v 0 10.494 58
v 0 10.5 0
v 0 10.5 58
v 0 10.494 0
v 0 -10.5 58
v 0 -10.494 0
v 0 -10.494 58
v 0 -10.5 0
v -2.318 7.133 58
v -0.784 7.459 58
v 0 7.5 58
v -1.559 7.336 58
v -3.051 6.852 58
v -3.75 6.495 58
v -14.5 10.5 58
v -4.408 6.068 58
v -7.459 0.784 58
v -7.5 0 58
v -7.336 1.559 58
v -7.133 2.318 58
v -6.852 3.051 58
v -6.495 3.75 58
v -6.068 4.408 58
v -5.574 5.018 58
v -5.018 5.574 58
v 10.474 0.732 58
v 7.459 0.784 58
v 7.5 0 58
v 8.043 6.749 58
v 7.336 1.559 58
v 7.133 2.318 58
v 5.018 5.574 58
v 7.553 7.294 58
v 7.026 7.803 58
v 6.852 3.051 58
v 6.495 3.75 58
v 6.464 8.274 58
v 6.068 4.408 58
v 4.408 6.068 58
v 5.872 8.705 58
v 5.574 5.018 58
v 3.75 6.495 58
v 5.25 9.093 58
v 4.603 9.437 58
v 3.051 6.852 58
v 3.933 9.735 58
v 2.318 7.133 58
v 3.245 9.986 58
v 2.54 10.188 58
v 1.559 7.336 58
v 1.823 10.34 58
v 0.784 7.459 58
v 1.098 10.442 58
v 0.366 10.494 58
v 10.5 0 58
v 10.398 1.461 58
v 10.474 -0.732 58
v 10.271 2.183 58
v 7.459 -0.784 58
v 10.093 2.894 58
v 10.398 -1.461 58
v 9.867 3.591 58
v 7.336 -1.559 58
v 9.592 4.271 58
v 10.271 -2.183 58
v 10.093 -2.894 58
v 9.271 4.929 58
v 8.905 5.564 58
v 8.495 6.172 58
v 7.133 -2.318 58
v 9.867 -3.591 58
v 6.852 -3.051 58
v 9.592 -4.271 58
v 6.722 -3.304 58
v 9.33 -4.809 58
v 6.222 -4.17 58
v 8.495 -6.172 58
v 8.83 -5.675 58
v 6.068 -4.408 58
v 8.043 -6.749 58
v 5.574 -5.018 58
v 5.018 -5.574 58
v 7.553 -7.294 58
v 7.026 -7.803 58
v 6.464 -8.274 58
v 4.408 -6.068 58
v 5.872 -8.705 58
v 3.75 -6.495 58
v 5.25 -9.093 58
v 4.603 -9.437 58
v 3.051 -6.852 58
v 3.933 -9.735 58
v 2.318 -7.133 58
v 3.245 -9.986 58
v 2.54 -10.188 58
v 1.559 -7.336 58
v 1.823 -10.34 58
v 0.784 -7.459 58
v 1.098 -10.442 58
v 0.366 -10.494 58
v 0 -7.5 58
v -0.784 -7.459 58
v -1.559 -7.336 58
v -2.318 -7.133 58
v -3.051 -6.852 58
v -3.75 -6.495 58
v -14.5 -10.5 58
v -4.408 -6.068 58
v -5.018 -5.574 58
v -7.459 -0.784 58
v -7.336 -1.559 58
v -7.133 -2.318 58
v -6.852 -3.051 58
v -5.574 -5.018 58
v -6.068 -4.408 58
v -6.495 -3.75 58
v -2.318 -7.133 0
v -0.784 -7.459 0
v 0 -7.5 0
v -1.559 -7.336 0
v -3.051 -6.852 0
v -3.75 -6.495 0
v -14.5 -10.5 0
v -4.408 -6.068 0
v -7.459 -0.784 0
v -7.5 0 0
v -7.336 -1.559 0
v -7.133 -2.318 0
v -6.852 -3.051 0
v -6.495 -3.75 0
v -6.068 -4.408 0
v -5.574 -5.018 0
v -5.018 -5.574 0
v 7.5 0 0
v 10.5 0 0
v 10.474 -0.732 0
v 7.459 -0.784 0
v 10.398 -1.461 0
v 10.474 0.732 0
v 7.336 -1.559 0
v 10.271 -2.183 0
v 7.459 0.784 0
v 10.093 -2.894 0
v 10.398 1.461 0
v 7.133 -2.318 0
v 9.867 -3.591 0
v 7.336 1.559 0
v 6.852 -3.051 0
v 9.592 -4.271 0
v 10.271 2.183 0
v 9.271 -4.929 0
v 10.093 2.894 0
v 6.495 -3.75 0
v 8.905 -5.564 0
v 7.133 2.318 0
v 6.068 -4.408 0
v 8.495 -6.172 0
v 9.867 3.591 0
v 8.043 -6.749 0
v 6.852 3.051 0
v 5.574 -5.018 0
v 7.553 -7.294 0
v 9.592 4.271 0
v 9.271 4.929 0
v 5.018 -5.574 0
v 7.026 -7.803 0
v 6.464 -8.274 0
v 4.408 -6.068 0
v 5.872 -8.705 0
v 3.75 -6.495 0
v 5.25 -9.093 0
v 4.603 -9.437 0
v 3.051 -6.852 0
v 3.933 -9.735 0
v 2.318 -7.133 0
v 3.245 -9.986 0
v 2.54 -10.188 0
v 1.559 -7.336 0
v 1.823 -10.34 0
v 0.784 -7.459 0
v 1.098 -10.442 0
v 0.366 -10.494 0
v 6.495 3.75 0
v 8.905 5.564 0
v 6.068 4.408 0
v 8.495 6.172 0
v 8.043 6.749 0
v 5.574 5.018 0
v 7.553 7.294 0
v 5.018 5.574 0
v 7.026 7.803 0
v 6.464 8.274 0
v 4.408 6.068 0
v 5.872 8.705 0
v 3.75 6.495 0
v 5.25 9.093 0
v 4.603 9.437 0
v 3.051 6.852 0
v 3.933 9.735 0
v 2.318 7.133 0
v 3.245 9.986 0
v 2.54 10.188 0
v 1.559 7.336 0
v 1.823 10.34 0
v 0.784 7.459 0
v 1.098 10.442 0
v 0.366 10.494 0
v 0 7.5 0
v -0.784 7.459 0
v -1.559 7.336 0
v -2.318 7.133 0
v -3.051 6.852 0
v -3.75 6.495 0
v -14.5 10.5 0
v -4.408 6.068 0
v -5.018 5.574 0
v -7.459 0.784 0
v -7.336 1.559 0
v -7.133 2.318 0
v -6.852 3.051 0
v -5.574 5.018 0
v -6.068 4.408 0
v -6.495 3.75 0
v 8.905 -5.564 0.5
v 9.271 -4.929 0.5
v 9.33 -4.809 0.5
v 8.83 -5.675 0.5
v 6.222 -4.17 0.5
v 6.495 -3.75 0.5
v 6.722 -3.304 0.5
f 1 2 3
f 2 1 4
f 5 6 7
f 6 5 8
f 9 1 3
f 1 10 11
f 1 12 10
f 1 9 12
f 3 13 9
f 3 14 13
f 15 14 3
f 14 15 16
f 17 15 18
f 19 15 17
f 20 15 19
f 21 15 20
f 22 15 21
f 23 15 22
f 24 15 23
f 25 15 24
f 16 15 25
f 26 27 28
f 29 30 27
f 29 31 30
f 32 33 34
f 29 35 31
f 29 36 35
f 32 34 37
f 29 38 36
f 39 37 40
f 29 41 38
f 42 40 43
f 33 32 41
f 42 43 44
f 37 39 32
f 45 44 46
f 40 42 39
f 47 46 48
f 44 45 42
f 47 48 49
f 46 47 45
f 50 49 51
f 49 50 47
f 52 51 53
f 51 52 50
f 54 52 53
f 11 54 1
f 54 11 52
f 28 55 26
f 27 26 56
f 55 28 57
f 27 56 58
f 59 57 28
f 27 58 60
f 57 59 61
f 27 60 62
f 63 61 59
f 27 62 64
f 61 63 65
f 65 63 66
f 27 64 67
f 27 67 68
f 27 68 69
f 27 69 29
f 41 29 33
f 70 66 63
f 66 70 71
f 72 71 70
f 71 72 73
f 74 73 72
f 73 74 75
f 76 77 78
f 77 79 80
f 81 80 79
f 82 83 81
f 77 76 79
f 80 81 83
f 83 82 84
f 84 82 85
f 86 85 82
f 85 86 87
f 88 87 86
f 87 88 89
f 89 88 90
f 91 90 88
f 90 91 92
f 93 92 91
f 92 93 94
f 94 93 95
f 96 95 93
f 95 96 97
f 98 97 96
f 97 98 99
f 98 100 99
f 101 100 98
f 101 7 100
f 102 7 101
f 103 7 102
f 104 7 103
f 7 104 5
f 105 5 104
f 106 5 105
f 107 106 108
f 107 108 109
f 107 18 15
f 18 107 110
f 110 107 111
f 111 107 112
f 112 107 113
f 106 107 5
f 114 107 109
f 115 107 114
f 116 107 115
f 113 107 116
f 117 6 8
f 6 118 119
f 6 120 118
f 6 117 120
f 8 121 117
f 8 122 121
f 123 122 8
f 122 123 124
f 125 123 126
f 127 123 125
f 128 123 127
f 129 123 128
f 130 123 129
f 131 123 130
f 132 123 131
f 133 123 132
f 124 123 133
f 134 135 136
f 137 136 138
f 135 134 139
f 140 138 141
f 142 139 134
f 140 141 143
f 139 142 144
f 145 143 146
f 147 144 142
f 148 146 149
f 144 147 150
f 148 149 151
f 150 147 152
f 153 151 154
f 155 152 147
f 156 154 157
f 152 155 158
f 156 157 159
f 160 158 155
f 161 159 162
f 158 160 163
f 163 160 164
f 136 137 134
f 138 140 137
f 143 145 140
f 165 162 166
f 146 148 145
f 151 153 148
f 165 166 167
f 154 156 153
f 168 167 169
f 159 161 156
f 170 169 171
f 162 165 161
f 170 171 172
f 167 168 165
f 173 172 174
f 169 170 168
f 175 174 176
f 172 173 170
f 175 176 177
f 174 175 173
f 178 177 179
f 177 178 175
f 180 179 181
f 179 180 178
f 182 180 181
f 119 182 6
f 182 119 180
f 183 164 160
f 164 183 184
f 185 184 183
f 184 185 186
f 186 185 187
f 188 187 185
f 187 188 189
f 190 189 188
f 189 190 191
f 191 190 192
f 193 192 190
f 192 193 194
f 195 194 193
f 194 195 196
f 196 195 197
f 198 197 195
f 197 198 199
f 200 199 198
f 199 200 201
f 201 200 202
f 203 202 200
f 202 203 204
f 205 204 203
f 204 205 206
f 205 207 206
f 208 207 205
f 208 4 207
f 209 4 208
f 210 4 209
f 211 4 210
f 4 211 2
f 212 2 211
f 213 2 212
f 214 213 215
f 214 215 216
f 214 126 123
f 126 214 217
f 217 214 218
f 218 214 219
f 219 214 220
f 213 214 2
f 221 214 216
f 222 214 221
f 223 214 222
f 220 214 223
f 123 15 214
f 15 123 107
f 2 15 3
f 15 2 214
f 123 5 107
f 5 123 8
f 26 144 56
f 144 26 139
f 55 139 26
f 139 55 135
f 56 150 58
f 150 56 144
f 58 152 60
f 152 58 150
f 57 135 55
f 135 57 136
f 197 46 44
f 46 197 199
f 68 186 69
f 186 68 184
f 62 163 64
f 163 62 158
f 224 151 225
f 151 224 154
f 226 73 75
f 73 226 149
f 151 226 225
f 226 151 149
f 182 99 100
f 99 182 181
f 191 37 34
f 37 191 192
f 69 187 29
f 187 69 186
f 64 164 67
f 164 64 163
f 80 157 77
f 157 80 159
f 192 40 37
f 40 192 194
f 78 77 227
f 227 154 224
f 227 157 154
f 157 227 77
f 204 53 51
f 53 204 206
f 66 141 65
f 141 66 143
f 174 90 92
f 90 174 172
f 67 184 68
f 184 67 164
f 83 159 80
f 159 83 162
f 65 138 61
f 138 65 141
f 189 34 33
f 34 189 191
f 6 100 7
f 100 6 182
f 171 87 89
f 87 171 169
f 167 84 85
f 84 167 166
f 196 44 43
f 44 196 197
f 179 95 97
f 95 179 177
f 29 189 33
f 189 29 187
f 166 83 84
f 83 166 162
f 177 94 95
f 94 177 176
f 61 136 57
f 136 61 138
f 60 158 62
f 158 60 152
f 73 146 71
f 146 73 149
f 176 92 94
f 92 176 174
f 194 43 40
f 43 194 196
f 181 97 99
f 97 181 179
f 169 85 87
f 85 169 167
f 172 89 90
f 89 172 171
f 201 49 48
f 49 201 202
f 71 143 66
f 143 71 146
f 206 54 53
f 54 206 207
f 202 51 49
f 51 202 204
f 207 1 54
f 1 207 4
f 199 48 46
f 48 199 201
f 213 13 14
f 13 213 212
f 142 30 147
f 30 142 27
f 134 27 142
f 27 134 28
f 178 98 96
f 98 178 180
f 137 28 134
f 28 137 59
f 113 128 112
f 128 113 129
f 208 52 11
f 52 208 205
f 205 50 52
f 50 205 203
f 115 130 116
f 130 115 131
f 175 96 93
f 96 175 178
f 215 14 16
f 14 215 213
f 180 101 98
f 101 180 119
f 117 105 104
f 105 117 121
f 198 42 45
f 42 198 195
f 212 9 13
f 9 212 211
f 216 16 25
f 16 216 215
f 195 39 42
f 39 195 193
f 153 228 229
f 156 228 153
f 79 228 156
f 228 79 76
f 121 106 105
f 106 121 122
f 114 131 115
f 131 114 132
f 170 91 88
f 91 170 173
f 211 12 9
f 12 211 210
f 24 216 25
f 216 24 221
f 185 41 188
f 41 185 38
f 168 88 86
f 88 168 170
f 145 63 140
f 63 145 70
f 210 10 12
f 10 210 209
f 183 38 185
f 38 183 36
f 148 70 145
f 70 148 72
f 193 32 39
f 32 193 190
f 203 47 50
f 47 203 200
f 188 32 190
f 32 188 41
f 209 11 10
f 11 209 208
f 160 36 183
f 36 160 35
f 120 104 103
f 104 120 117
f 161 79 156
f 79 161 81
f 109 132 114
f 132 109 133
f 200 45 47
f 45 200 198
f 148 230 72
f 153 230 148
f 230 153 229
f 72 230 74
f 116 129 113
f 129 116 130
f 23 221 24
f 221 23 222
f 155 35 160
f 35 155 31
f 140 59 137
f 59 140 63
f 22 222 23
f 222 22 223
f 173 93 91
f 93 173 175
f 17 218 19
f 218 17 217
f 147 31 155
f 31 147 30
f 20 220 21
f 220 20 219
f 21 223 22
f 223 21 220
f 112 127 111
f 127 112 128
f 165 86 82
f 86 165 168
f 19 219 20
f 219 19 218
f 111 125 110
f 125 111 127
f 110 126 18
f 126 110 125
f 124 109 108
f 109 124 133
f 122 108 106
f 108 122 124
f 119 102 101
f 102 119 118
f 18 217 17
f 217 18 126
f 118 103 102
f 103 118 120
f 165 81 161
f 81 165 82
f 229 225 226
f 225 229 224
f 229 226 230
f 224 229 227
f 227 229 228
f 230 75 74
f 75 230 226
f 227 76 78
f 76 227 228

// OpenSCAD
// PRUSA iteration3
// Bearing holders
// GNU GPL v3
// Josef Průša <iam@josefprusa.cz> and contributors
// http://www.reprap.org/wiki/Prusa_Mendel
// http://prusamendel.org

bearing_diameter = 15;

module horizontal_bearing_base(bearings=1){
 translate(v=[0,0,6]) cube(size = [24,8+bearings*25,12], center = true);	
}
module horizontal_bearing_holes(bearings=1){
 cutter_lenght = 10+bearings*25;
 one_holder_lenght = 8+25;
 holder_lenght = 8+bearings*25;
 
 // Main bearing cut
 difference(){
  translate(v=[0,0,12+1.5]) rotate(a=[90,0,0]) translate(v=[0,0,-cutter_lenght/2]) cylinder(h = cutter_lenght, r=bearing_diameter/2, $fn=50);
  // Bearing retainers
  translate(v=[0,1-holder_lenght/2,3+1.5]) cube(size = [24,6,8], center = true);
  translate(v=[0,-1+holder_lenght/2,3+1.5]) cube(size = [24,6,8], center = true);
 }
 
 // Ziptie cutouts
 ziptie_cut_ofset = 0;
 for ( i = [0 : bearings-1] ){
  // For easier positioning I move them by half of one 
  // bearing holder then add each bearign lenght and then center again
  translate(v=[0,-holder_lenght/2,0]) translate(v=[0,one_holder_lenght/2+i*25,0]) difference(){
   union(){
    translate(v=[0,2-6,12]) rotate(a=[90,0,0]) translate(v=[0,0,0]) cylinder(h = 4, r=12.5, $fn=50);
    translate(v=[0,2+6,12]) rotate(a=[90,0,0]) translate(v=[0,0,0]) cylinder(h = 4, r=12.5, $fn=50);
   }
   translate(v=[0,10,12]) rotate(a=[90,0,0]) translate(v=[0,0,0]) cylinder(h = 24, r=10, $fn=50);
  }
 }
 
}

module horizontal_bearing_test(){
 difference(){
  horizontal_bearing_base(1);
  horizontal_bearing_holes(1);
 }
 translate(v=[30,0,0]) difference(){
  horizontal_bearing_base(2);
  horizontal_bearing_holes(2);
 }
 translate(v=[60,0,0]) difference(){
  horizontal_bearing_base(3);
  horizontal_bearing_holes(3);
 }
}



thinwall = 3;
bearing_size = bearing_diameter + 2 * thinwall;

module vertical_bearing_base(){
 translate(v=[-2-bearing_size/4,0,29]) cube(size = [4+bearing_size/2,bearing_size,58], center = true);
 cylinder(h = 58, r=bearing_size/2, $fn = 90);
}

module vertical_bearing_holes(){
  translate(v=[0,0,-1]) cylinder(h = 62, r=bearing_diameter/2, $fn = 60);
  rotate(a=[0,0,-30]) translate(v=[8,0,31.5]) cube(size = [5,1,62], center = true);
}

difference(){
vertical_bearing_base();
vertical_bearing_holes();
}
